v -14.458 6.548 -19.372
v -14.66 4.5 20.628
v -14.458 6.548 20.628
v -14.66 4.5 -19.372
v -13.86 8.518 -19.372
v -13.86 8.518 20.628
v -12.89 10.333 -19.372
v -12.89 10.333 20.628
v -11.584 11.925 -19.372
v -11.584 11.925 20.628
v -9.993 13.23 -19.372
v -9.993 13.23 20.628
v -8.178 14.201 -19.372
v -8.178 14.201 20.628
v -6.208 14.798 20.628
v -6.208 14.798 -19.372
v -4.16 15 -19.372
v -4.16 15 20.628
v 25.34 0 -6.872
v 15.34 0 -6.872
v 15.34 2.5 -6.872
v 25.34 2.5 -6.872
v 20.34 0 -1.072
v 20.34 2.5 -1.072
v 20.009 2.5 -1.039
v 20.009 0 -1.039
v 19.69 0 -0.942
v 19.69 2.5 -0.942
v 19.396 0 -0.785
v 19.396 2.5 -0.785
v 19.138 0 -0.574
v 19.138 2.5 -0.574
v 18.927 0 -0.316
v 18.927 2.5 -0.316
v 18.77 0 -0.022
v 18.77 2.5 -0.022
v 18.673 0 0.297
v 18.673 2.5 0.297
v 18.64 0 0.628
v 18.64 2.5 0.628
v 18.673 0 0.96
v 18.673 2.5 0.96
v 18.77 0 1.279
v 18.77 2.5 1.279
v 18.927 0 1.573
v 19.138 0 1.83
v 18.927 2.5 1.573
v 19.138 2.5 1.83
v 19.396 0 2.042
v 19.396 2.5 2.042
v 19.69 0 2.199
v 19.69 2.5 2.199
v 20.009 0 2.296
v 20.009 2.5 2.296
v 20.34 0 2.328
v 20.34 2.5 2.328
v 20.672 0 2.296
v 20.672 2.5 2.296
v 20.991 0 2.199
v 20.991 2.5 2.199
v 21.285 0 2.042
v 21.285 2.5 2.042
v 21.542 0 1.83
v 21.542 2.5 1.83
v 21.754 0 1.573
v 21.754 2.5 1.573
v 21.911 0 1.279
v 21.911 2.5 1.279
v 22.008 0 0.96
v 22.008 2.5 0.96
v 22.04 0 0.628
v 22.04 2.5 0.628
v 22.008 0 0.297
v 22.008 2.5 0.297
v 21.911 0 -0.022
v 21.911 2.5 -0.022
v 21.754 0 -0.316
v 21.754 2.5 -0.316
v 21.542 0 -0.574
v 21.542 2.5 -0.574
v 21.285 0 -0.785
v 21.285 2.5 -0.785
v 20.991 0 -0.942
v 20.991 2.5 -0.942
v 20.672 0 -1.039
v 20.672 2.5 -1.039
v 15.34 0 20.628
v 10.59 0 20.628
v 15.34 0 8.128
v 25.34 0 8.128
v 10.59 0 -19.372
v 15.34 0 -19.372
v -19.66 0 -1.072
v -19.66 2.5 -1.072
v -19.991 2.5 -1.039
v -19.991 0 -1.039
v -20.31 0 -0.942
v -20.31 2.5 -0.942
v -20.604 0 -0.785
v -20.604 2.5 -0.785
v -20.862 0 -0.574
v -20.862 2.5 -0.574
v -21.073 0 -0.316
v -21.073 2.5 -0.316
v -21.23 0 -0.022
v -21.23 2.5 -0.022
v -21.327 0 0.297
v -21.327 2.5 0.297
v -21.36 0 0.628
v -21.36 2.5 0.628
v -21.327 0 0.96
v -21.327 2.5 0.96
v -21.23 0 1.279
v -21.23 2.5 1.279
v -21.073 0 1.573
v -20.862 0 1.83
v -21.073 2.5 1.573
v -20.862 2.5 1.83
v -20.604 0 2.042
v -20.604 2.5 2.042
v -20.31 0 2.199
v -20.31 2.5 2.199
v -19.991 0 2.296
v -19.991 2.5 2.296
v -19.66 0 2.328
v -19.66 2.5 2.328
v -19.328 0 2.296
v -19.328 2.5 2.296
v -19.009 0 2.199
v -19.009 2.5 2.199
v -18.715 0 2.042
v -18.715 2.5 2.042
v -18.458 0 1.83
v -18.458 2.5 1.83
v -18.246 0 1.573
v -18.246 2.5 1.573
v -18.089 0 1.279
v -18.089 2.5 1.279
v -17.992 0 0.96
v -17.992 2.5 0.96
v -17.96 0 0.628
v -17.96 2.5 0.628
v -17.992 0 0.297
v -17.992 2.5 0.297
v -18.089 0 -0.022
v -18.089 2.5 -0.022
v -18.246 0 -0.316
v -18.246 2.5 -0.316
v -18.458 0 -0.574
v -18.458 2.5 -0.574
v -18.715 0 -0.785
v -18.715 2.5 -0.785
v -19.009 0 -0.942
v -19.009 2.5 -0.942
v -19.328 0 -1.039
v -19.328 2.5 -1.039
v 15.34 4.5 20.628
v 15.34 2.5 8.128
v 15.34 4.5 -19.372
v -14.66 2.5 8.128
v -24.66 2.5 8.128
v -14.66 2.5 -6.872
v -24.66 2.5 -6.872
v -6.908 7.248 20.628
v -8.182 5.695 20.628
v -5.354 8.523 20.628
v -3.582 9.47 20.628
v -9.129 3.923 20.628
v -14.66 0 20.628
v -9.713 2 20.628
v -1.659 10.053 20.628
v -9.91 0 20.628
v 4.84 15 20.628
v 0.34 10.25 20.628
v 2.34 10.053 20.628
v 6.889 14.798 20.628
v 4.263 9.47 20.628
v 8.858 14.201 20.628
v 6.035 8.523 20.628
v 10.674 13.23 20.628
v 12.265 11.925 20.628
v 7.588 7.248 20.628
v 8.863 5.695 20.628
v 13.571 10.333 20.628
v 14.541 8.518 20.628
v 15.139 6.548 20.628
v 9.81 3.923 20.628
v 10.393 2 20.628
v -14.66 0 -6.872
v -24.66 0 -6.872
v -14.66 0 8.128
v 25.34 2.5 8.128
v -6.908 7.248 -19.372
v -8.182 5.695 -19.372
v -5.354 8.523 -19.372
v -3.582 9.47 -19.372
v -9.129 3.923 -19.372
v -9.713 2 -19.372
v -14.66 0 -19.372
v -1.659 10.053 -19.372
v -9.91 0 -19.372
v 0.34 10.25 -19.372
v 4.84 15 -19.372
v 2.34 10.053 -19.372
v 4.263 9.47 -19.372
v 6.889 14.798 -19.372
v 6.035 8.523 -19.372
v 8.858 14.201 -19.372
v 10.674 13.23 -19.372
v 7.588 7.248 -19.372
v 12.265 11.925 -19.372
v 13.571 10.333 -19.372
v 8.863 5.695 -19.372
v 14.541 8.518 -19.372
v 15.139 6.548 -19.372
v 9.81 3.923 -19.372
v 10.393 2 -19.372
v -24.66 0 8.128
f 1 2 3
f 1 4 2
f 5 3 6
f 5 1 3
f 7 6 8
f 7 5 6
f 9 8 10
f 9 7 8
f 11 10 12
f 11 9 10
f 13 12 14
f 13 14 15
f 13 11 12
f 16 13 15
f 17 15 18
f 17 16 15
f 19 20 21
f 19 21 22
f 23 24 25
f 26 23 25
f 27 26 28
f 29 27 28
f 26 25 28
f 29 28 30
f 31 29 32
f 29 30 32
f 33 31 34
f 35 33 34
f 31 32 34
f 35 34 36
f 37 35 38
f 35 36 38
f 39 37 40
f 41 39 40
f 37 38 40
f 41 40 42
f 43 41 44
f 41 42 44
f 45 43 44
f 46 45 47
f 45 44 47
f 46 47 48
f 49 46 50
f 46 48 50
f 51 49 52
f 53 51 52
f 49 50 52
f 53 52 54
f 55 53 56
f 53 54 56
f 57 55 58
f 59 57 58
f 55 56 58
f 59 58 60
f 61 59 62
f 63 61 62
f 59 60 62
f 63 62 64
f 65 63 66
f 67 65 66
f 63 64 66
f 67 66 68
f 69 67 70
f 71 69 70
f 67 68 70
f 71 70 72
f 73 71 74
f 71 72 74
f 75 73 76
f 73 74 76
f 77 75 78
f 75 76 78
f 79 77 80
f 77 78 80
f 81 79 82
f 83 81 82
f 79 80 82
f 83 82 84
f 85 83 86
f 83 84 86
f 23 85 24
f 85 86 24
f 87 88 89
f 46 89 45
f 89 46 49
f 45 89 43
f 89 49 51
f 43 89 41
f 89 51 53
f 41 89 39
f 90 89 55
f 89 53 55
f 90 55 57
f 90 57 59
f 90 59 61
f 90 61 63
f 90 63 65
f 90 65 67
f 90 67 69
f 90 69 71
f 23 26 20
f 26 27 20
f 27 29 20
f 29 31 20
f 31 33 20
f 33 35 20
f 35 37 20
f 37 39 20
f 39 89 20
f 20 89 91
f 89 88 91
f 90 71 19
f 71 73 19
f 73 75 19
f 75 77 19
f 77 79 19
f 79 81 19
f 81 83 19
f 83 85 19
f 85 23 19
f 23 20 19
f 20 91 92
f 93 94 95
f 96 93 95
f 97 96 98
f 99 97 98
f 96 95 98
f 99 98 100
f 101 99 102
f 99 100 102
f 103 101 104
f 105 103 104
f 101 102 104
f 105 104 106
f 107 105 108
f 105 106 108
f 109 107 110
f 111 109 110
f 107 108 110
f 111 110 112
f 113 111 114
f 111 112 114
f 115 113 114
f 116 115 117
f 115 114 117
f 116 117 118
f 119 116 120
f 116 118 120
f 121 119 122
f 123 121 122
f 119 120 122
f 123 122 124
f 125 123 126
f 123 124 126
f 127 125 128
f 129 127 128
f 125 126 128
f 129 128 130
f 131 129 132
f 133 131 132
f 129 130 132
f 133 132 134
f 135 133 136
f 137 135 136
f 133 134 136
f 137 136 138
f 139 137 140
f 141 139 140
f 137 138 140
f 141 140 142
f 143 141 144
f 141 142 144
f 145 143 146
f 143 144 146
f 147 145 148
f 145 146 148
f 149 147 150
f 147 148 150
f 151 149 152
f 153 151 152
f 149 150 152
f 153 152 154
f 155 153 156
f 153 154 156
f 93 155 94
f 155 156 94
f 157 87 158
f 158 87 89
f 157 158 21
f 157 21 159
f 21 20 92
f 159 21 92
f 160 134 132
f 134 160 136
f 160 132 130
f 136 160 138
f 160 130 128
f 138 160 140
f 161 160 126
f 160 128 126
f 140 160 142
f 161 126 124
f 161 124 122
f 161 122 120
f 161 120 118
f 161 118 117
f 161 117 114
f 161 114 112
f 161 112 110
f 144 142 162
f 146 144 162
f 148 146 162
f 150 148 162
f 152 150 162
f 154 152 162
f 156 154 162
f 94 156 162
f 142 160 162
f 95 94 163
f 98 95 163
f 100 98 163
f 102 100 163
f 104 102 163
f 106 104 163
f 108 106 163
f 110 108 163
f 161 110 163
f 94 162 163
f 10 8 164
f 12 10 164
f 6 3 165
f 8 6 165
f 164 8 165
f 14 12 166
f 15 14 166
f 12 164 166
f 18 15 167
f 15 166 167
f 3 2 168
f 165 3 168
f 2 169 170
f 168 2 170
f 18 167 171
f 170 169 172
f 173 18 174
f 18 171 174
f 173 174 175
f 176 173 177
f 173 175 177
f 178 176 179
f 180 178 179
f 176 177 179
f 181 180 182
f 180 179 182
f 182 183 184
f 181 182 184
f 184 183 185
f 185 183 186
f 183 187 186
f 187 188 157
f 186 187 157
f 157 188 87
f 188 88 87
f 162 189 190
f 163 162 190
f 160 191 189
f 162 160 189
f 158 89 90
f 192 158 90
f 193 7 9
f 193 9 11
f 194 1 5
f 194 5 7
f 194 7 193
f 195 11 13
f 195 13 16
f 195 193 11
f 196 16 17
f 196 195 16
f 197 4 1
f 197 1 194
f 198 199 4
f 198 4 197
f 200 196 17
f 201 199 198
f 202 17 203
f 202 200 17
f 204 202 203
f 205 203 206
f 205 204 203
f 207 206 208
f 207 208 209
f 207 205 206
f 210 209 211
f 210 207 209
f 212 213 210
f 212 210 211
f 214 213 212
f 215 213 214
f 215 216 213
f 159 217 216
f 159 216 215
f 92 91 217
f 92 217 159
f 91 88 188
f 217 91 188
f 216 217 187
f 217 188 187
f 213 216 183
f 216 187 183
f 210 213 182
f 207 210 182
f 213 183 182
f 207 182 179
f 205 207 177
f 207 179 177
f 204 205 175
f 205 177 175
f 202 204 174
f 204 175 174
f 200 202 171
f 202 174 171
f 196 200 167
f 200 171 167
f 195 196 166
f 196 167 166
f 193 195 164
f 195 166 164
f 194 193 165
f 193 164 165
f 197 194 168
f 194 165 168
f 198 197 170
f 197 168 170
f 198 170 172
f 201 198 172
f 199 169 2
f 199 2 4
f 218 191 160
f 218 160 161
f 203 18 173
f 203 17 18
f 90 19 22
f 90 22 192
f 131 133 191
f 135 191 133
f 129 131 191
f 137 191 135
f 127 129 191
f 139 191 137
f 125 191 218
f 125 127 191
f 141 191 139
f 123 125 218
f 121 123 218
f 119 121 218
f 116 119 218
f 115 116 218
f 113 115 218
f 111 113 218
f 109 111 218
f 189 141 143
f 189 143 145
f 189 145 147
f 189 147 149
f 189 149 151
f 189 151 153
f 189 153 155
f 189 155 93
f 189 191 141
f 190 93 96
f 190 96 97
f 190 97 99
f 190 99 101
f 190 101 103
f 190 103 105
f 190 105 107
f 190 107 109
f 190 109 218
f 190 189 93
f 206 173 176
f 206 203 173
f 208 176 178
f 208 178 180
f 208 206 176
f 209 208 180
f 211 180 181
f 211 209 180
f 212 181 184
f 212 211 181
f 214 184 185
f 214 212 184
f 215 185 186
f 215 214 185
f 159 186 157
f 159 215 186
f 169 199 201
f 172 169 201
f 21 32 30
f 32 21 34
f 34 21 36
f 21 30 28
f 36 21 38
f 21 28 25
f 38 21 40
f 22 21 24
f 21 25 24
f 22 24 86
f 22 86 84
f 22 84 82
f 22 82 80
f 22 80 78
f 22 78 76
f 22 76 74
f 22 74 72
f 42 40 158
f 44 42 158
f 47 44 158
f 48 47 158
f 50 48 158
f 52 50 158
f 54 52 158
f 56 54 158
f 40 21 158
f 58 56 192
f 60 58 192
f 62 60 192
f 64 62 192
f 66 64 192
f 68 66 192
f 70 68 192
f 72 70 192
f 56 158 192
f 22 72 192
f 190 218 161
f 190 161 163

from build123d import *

# Parameters (mm, degrees)
SKETCH1_W                     = 30
SKETCH1_H                     = 40
BOSS_EXTRUDE1_DEPTH           = 15
SKETCH2_R                     = 10.25
CUT_EXTRUDE1_DEPTH            = 41
SKETCH3_W                     = 10
SKETCH3_H                     = 15
BOSS_EXTRUDE2_DEPTH           = 2.5
SKETCH4_W                     = 10
SKETCH4_H                     = 15
BOSS_EXTRUDE3_DEPTH           = 2.5
SKETCH6_W                     = 1.7
SKETCH6_H                     = 2.501
M3_CLEARANCE_HOLE1_AT_2_COUNT = 2
M3_CLEARANCE_HOLE1_AT_2_PITCH = 40
FILLET1_R                     = 10.5


with BuildPart() as part:
    # Sketch1 → Boss-Extrude1 (new body)
    with BuildSketch(Plane(origin=(0, 0, 0), x_dir=(1, 0, 0), z_dir=(0, 1, 0))):
        with Locations((0.340314136, -0.628272251)):
            Rectangle(SKETCH1_W, SKETCH1_H)
    extrude(amount=BOSS_EXTRUDE1_DEPTH)

    # Sketch2 → Cut-Extrude1 (cut, through all)
    with BuildSketch(Plane.XY.offset(20.628272251)):
        with Locations((0.340314136, 0)):
            Circle(SKETCH2_R)
    extrude(amount=-CUT_EXTRUDE1_DEPTH, mode=Mode.SUBTRACT)

    # Sketch4 → Boss-Extrude3 (add)
    with BuildSketch(Plane.XZ):
        with Locations((20.340314136, 0.628272251)):
            Rectangle(SKETCH4_W, SKETCH4_H)
    extrude(amount=-BOSS_EXTRUDE3_DEPTH)

    # Sketch6 → M3 Clearance Hole1 (revolve, cut)
    with BuildSketch(Plane(origin=(20.340314136, 0, 0.628272251), x_dir=(0, 0, -1), z_dir=(1, 0, 0))):
        with Locations((0.85, 1.2505)):
            Rectangle(SKETCH6_W, SKETCH6_H)
    m3_clearance_hole1 = revolve(axis=Axis((20.340314136, -6.35, 0.628272251), (0, 1, 0)), mode=Mode.SUBTRACT)

    # Fillet1
    fillet1_edges = [part.edges().sort_by_distance(p)[0] for p in [
        (15.340314136, 15, 0.628272251),
        (-14.659685864, 15, 0.628272251),
    ]]
    fillet(fillet1_edges, radius=FILLET1_R)


with BuildPart() as body_2:
    # Sketch3 → Boss-Extrude2 (new body)
    with BuildSketch(Plane(origin=(0, 0, 0), x_dir=(-1, 0, 0), z_dir=(0, -1, 0))):
        with Locations((19.659685864, -0.628272251)):
            Rectangle(SKETCH3_W, SKETCH3_H)
    extrude(amount=-BOSS_EXTRUDE2_DEPTH)

    # M3 Clearance Hole1 at 2: M3 Clearance Hole1 ×2
    with Locations(*[(-i * M3_CLEARANCE_HOLE1_AT_2_PITCH, 0, 0) for i in range(1, M3_CLEARANCE_HOLE1_AT_2_COUNT)]):
        add(m3_clearance_hole1, mode=Mode.SUBTRACT)


solid = Compound([part.part, body_2.part])
